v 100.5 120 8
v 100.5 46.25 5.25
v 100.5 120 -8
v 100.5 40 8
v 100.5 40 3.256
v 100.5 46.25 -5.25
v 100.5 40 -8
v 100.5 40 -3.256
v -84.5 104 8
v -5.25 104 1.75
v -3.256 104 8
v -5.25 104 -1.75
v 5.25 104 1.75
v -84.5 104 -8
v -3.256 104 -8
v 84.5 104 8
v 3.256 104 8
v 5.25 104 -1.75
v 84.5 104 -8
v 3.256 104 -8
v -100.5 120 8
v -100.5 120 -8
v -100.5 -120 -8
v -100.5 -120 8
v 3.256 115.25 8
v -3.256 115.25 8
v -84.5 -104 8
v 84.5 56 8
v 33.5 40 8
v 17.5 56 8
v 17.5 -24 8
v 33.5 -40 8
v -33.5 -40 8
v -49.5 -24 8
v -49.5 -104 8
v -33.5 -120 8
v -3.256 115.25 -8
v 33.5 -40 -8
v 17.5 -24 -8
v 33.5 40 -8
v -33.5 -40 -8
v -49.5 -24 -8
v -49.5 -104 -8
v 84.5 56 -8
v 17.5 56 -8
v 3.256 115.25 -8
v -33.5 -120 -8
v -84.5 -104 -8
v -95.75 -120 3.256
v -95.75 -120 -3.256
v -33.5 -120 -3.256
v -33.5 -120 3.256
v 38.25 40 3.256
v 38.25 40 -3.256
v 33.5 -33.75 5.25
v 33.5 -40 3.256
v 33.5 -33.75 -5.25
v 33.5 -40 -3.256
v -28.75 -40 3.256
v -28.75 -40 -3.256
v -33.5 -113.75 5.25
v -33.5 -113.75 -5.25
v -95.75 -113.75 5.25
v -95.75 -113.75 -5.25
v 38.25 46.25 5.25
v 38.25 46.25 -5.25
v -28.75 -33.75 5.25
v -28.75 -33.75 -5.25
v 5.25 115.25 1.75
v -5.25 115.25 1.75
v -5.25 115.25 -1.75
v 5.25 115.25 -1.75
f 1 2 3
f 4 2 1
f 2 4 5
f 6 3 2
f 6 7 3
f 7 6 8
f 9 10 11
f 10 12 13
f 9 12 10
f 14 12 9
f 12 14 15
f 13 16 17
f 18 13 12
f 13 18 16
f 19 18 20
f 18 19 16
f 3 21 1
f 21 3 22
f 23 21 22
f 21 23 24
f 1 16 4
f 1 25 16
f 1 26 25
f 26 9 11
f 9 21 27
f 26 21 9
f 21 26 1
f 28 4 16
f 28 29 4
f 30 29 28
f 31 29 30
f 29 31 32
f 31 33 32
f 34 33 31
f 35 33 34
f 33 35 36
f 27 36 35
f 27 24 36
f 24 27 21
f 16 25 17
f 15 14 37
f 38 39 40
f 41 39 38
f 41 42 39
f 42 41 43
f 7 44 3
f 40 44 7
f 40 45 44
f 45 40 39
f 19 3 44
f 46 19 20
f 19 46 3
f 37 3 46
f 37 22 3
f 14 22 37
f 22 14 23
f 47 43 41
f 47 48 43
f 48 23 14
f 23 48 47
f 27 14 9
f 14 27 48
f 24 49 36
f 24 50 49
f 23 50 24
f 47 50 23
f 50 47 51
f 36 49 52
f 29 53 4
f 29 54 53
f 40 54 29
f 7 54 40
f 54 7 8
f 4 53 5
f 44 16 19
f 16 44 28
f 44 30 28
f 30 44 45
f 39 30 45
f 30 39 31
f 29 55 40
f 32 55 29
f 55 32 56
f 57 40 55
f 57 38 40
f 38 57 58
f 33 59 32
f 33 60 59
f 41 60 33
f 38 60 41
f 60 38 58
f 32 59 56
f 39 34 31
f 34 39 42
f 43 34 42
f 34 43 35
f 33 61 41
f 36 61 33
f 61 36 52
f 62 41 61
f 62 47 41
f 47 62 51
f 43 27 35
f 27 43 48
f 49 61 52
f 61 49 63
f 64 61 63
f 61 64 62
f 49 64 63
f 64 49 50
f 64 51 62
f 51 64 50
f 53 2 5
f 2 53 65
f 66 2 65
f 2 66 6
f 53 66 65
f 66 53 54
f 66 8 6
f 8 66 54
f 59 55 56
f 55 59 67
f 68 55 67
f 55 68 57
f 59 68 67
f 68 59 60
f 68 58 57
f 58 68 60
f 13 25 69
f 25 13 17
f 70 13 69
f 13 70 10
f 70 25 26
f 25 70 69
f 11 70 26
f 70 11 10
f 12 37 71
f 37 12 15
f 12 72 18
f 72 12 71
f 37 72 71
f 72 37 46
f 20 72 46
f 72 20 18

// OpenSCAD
// file: wall.scad
include <common.scad>
include <config.scad>

wall_total_l = shelf_d * 3;
wall_total_h = shelf_h_sep * 3;

module wall_common()
{
	difference()
	{
		union()
		{
			/* main horizontal */
			translate([0, 0, -(wall_total_h / 2) + (wall_t / 2)])
				color(color_wall)
					cube([wall_total_l, wall_t, wall_t], center=true);

			/* main vertical */
			translate([-(wall_total_l / 2) + (wall_t / 2), 0, 0])
				color(color_wall)
					cube([wall_t, wall_t, wall_total_h], center=true);

			/* shelf 1 vertical */
			translate([(wall_total_l / 2) - (wall_t / 2), 0, -(shelf_h_sep)])
				color(color_wall)
					cube([wall_t, wall_t, shelf_h_sep], center=true);

			/* shelf 1 horizontal */
			translate([(wall_total_l / 2) - ((shelf_d + wall_t) / 2), 0, -(shelf_h_sep / 2) - (wall_t / 2)])
				color(color_wall)
					cube([shelf_d + wall_t, wall_t, wall_t], center=true);

			/* shelf 2 vertical */
			translate([(shelf_d / 2) - (wall_t / 2), 0, 0])
				color(color_wall)
					cube([wall_t, wall_t, shelf_h_sep], center=true);

			/* shelf 2 horizontal */
			translate([-(wall_t / 2), 0, (shelf_h_sep / 2) - (wall_t / 2)])
				color(color_wall)
					cube([shelf_d + wall_t, wall_t, wall_t], center=true);

			/* shelf 3 vertical */
			translate([-(shelf_d / 2) - (wall_t / 2), 0, +(shelf_h_sep)])
				color(color_wall)
					cube([wall_t, wall_t, shelf_h_sep], center=true);

			/* shelf 3 horizontal */
			translate([-shelf_d, 0, (wall_total_h / 2) - (wall_t / 2)])
				color(color_wall)
					cube([shelf_d, wall_t, wall_t], center=true);
		}

		/* Shelf 1 dovetail */
		translate([
			-(shelf_d / 2) + eps,
			0,
			(wall_total_h / 2) + eps
		])
			rotate([0, 0, 90])
				color(color_test)
					dovetail(
						length = shelf_dovetail_len + clearance + eps,
						depth = joint_depth + clearance + eps,
						neck = joint_neck + 2 * clearance,
						head = joint_head + 2 * clearance
					);

		/* Shelf 2 dovetail */
		translate([
			(shelf_d * 3 / 2) + eps,
			0,
			-(shelf_h_sep / 2) + eps
		])
			rotate([0, 0, 90])
				color(color_test)
					dovetail(
						length = shelf_dovetail_len + clearance + eps,
						depth = joint_depth + clearance + eps,
						neck = joint_neck + 2 * clearance,
						head = joint_head + 2 * clearance
					);

		/* Shelf 3 dovetail */
		translate([
			(shelf_d / 2) + eps,
			0,
			(shelf_h_sep / 2) + eps
		])
			rotate([0, 0, 90])
				color(color_test)
					dovetail(
						length = shelf_dovetail_len + clearance + eps,
						depth = joint_depth + clearance + eps,
						neck = joint_neck + 2 * clearance,
						head = joint_head + 2 * clearance
					);

		/* Base dovetail 1 */
		translate([
			0,
			(wall_t / 2) + eps,
			-(wall_total_h / 2) + wall_t + eps
		])
			rotate([270, 0, 0])
				color(color_test)
					dovetail(
						length = wall_dovetail_len + clearance + eps,
						depth = joint_depth + clearance + eps,
						neck = joint_neck + 2 * clearance,
						head = joint_head + 2 * clearance
					);
	}
}

module wall()
{
	difference()
	{
		/* Wall */
		wall_common();

		/* Base dovetail 2 */
		translate([
			0,
			-(wall_t / 2) - eps,
			-(wall_total_h / 2) + wall_t + eps
		])
			rotate([90, 180, 0])
				color(color_test)
					dovetail(
						length = wall_dovetail_len + clearance + eps,
						depth = joint_depth + clearance + eps,
						neck = joint_neck + 2 * clearance,
						head = joint_head + 2 * clearance
					);
	}
}


module wall_middle()
{
	shelf_y = -(wall_t + (clearance / 2));

	difference()
	{
		union()
		{
			wall_common();

			/* shelf 1 horizontal */
			translate([(wall_total_l / 2) - ((shelf_d + wall_t) / 2), shelf_y, -(shelf_h_sep / 2) - (wall_t / 2)])
				color(color_wall)
					cube([shelf_d + wall_t, wall_t + clearance, wall_t], center=true);

			/* shelf 2 horizontal */
			translate([-(wall_t / 2), shelf_y, (shelf_h_sep / 2) - (wall_t / 2)])
				color(color_wall)
					cube([shelf_d + wall_t, wall_t + clearance, wall_t], center=true);

			/* shelf 3 horizontal */
			translate([-shelf_d, shelf_y, (wall_total_h / 2) - (wall_t / 2)])
				color(color_wall)
					cube([shelf_d, wall_t + clearance, wall_t], center=true);

			/* Base 2 */
			translate([0, -wall_t, -(wall_total_h / 2) + (wall_t / 2)])
				color(color_wall)
					cube([wall_t * 2, wall_t + (clearance * 2), wall_t], center=true);
		}

		/* Shelf 1 dovetail */
		translate([
			-(shelf_d / 2) + eps,
			-(wall_t + clearance),
			(wall_total_h / 2) + eps
		])
			rotate([0, 0, 90])
				color(color_test)
					dovetail(
						length = shelf_dovetail_len + clearance + eps,
						depth = joint_depth + clearance + eps,
						neck = joint_neck + 2 * clearance,
						head = joint_head + 2 * clearance
					);

		/* Shelf 2 dovetail */
		translate([
			(shelf_d * 3 / 2) + eps,
			-(wall_t + clearance),
			-(shelf_h_sep / 2) + eps
		])
			rotate([0, 0, 90])
				color(color_test)
					dovetail(
						length = shelf_dovetail_len + clearance + eps,
						depth = joint_depth + clearance + eps,
						neck = joint_neck + 2 * clearance,
						head = joint_head + 2 * clearance
					);

		/* Shelf 3 dovetail */
		translate([
			(shelf_d / 2) + eps,
			-(wall_t + clearance),
			(shelf_h_sep / 2) + eps
		])
			rotate([0, 0, 90])
				color(color_test)
					dovetail(
						length = shelf_dovetail_len + clearance + eps,
						depth = joint_depth + clearance + eps,
						neck = joint_neck + 2 * clearance,
						head = joint_head + 2 * clearance
					);

		/* Base dovetail 2 */
		translate([
			0,
			-(wall_t + clearance) -(wall_t / 2) - eps,
			-(wall_total_h / 2) + wall_t + eps
		])
			rotate([90, 180, 0])
				color(color_test)
					dovetail(
						length = wall_dovetail_len + clearance + eps,
						depth = joint_depth + clearance + eps,
						neck = joint_neck + 2 * clearance,
						head = joint_head + 2 * clearance
					);
	}
}
// file: config.scad
clearance = 0.25;
eps = 0.02;

color_dovetail = "red";
color_joint = "purple";
color_print = "white";
color_shelf = "green";
color_test = "black";
color_wall = "orange";

shelf_d = 67;
shelf_h_sep = 80;
shelf_t = 6;
shelf_w = 240;

wall_cut = 25;
wall_t = 16;

joint_depth = 6;
joint_neck = 6;
joint_head = 10;
back_stop = 5;

shelf_dovetail_len = shelf_d - back_stop;
wall_dovetail_len = wall_t - back_stop;
// file: common.scad
include <config.scad>

module dovetail(length,
	depth,
	neck,
	head)
{
	rotate([-90, 0, 0])
		linear_extrude(height = length, convexity = 10)
			polygon(points = [
				[-neck / 2, 0],
				[-head / 2, depth],
				[ head / 2, depth],
				[ neck / 2, 0]
			]);
}
// main file
include <common.scad>
include <config.scad>
include <wall.scad>

rotate([90, 0, 0])
	color(color_print)
		wall();
